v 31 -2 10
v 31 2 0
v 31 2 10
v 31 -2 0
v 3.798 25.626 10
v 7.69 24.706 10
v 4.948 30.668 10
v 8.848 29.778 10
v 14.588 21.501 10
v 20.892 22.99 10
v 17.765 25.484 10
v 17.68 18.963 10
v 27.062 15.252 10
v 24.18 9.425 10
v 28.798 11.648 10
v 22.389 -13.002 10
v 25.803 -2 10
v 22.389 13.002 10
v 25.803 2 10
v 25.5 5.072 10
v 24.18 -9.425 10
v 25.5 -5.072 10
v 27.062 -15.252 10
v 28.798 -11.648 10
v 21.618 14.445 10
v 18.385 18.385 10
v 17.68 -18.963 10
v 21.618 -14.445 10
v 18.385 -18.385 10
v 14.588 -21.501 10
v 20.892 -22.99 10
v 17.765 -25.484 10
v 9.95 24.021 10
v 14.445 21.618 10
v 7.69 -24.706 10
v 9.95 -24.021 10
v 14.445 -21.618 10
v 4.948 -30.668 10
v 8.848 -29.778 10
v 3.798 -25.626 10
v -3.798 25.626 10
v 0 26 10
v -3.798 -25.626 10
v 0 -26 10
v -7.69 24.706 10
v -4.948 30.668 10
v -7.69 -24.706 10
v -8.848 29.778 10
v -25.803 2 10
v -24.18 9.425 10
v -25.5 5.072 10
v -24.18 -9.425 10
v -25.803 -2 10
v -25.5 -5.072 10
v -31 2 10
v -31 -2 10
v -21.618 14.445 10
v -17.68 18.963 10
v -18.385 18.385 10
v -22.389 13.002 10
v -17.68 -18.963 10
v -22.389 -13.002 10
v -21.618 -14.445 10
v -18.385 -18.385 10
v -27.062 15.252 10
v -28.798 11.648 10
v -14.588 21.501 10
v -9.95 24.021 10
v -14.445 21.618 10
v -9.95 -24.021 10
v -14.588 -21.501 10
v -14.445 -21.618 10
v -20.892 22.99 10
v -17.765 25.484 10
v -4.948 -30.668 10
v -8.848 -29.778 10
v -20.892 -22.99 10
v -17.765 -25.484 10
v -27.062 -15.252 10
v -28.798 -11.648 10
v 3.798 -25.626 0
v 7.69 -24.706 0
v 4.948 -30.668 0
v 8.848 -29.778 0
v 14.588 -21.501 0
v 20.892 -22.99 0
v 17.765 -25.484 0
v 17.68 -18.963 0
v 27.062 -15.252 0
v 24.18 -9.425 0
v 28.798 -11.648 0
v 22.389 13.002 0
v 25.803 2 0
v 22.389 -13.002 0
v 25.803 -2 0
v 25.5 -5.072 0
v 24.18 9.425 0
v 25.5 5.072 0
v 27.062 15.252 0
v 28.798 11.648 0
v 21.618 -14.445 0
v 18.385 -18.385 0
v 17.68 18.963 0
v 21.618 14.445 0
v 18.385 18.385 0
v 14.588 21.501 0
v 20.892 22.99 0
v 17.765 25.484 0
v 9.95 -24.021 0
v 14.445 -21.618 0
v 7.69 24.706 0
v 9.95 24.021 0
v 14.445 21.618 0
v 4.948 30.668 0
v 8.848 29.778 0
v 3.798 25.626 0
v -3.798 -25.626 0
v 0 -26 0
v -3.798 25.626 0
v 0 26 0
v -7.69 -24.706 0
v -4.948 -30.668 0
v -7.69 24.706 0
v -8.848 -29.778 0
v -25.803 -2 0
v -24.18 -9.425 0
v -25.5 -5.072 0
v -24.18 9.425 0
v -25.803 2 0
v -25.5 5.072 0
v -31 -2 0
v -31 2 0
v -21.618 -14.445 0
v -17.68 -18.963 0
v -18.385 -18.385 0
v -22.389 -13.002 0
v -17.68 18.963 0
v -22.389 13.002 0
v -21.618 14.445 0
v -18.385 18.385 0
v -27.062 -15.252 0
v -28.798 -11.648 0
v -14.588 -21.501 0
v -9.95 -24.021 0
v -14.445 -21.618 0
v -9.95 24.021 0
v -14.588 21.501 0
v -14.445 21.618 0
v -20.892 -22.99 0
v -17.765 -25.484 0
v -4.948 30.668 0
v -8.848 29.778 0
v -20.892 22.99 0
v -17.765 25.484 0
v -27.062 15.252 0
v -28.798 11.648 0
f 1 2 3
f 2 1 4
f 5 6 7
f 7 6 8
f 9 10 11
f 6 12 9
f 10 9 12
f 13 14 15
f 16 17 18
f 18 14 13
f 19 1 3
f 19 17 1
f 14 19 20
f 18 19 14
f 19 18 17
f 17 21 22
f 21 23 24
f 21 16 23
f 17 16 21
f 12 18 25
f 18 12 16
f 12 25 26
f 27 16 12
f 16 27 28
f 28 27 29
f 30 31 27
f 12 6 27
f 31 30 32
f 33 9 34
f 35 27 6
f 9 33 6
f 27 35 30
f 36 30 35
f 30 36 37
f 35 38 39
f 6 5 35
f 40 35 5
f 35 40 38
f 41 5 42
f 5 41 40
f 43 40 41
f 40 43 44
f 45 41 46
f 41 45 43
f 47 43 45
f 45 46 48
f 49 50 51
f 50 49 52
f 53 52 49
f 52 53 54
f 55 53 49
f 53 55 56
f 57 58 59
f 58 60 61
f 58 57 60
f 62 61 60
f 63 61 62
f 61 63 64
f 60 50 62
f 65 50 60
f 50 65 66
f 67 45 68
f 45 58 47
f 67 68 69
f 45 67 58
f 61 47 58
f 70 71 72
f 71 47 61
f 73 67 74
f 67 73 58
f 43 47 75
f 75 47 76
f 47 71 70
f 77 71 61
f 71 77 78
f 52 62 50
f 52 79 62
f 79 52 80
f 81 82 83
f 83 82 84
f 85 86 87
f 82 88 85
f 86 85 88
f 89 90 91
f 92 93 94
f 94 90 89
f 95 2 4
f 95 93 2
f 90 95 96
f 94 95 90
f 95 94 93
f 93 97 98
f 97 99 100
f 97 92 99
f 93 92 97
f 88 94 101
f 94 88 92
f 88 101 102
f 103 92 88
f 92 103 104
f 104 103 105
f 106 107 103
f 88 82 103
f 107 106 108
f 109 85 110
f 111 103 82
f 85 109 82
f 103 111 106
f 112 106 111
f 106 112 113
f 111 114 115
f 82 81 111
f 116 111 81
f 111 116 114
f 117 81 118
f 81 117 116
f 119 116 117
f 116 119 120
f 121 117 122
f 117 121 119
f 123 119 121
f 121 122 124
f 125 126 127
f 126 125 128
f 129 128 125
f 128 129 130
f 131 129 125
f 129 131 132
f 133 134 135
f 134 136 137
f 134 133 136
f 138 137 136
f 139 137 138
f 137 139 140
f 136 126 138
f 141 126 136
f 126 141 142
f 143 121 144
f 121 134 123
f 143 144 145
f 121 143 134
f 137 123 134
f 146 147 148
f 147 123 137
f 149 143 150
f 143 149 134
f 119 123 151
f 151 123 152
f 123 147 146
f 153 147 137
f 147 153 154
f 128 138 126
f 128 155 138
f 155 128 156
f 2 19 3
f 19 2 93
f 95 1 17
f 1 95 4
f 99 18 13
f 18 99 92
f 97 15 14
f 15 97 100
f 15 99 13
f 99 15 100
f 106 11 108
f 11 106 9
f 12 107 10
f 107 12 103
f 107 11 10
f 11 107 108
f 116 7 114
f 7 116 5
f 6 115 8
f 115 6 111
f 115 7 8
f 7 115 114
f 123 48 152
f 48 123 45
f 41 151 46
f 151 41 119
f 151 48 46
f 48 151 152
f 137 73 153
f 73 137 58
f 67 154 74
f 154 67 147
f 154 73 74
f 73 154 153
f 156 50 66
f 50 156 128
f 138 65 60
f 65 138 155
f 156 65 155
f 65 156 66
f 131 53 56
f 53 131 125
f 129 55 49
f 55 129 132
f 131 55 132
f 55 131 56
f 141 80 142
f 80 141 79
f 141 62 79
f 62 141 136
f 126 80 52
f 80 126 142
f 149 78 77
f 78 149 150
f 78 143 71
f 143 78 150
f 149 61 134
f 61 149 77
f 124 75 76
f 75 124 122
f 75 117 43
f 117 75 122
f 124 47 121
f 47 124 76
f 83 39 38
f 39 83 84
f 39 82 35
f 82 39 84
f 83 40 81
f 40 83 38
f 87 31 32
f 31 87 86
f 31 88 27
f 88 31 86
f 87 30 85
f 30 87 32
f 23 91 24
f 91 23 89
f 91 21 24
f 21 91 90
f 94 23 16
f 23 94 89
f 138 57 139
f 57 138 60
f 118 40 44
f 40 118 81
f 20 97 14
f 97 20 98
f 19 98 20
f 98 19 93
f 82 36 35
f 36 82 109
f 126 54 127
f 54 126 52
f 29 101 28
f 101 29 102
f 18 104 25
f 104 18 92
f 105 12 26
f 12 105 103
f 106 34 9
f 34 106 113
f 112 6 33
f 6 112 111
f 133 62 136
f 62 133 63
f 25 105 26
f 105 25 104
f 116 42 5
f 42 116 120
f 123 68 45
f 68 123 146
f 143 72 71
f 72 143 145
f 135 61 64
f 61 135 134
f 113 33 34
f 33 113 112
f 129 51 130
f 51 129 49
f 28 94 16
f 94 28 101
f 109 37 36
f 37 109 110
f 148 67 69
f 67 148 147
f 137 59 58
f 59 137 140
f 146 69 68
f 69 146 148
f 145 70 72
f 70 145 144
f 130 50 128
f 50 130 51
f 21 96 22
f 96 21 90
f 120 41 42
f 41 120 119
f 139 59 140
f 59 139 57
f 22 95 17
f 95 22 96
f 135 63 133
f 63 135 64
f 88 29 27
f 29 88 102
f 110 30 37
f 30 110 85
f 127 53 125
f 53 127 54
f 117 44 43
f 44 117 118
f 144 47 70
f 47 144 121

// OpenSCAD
$fn = 32;

// ----------------------------------------------------------------------
// Spur blank: plain gear blank
// ----------------------------------------------------------------------

// --- parameters (mm) ---
disc_r = 26;              // blank root radius
disc_t = 10;              // blank thickness
n_teeth = 14;             // stub tooth count
tooth_w = 4;              // tooth width at the root
tooth_h = 5;              // tooth height above the root

out_r = disc_r + tooth_h;  // tip radius
bbox_x = 62.0;  // measured width over the teeth
bbox_y = 61.34;  // measured depth over the teeth

union() {
  cylinder(r = disc_r, h = disc_t);
  for (i = [0 : n_teeth - 1])
    rotate([0, 0, i * 360 / n_teeth])
      translate([disc_r - 1, -tooth_w / 2, 0])
        cube([tooth_h + 1, tooth_w, disc_t]);
}
